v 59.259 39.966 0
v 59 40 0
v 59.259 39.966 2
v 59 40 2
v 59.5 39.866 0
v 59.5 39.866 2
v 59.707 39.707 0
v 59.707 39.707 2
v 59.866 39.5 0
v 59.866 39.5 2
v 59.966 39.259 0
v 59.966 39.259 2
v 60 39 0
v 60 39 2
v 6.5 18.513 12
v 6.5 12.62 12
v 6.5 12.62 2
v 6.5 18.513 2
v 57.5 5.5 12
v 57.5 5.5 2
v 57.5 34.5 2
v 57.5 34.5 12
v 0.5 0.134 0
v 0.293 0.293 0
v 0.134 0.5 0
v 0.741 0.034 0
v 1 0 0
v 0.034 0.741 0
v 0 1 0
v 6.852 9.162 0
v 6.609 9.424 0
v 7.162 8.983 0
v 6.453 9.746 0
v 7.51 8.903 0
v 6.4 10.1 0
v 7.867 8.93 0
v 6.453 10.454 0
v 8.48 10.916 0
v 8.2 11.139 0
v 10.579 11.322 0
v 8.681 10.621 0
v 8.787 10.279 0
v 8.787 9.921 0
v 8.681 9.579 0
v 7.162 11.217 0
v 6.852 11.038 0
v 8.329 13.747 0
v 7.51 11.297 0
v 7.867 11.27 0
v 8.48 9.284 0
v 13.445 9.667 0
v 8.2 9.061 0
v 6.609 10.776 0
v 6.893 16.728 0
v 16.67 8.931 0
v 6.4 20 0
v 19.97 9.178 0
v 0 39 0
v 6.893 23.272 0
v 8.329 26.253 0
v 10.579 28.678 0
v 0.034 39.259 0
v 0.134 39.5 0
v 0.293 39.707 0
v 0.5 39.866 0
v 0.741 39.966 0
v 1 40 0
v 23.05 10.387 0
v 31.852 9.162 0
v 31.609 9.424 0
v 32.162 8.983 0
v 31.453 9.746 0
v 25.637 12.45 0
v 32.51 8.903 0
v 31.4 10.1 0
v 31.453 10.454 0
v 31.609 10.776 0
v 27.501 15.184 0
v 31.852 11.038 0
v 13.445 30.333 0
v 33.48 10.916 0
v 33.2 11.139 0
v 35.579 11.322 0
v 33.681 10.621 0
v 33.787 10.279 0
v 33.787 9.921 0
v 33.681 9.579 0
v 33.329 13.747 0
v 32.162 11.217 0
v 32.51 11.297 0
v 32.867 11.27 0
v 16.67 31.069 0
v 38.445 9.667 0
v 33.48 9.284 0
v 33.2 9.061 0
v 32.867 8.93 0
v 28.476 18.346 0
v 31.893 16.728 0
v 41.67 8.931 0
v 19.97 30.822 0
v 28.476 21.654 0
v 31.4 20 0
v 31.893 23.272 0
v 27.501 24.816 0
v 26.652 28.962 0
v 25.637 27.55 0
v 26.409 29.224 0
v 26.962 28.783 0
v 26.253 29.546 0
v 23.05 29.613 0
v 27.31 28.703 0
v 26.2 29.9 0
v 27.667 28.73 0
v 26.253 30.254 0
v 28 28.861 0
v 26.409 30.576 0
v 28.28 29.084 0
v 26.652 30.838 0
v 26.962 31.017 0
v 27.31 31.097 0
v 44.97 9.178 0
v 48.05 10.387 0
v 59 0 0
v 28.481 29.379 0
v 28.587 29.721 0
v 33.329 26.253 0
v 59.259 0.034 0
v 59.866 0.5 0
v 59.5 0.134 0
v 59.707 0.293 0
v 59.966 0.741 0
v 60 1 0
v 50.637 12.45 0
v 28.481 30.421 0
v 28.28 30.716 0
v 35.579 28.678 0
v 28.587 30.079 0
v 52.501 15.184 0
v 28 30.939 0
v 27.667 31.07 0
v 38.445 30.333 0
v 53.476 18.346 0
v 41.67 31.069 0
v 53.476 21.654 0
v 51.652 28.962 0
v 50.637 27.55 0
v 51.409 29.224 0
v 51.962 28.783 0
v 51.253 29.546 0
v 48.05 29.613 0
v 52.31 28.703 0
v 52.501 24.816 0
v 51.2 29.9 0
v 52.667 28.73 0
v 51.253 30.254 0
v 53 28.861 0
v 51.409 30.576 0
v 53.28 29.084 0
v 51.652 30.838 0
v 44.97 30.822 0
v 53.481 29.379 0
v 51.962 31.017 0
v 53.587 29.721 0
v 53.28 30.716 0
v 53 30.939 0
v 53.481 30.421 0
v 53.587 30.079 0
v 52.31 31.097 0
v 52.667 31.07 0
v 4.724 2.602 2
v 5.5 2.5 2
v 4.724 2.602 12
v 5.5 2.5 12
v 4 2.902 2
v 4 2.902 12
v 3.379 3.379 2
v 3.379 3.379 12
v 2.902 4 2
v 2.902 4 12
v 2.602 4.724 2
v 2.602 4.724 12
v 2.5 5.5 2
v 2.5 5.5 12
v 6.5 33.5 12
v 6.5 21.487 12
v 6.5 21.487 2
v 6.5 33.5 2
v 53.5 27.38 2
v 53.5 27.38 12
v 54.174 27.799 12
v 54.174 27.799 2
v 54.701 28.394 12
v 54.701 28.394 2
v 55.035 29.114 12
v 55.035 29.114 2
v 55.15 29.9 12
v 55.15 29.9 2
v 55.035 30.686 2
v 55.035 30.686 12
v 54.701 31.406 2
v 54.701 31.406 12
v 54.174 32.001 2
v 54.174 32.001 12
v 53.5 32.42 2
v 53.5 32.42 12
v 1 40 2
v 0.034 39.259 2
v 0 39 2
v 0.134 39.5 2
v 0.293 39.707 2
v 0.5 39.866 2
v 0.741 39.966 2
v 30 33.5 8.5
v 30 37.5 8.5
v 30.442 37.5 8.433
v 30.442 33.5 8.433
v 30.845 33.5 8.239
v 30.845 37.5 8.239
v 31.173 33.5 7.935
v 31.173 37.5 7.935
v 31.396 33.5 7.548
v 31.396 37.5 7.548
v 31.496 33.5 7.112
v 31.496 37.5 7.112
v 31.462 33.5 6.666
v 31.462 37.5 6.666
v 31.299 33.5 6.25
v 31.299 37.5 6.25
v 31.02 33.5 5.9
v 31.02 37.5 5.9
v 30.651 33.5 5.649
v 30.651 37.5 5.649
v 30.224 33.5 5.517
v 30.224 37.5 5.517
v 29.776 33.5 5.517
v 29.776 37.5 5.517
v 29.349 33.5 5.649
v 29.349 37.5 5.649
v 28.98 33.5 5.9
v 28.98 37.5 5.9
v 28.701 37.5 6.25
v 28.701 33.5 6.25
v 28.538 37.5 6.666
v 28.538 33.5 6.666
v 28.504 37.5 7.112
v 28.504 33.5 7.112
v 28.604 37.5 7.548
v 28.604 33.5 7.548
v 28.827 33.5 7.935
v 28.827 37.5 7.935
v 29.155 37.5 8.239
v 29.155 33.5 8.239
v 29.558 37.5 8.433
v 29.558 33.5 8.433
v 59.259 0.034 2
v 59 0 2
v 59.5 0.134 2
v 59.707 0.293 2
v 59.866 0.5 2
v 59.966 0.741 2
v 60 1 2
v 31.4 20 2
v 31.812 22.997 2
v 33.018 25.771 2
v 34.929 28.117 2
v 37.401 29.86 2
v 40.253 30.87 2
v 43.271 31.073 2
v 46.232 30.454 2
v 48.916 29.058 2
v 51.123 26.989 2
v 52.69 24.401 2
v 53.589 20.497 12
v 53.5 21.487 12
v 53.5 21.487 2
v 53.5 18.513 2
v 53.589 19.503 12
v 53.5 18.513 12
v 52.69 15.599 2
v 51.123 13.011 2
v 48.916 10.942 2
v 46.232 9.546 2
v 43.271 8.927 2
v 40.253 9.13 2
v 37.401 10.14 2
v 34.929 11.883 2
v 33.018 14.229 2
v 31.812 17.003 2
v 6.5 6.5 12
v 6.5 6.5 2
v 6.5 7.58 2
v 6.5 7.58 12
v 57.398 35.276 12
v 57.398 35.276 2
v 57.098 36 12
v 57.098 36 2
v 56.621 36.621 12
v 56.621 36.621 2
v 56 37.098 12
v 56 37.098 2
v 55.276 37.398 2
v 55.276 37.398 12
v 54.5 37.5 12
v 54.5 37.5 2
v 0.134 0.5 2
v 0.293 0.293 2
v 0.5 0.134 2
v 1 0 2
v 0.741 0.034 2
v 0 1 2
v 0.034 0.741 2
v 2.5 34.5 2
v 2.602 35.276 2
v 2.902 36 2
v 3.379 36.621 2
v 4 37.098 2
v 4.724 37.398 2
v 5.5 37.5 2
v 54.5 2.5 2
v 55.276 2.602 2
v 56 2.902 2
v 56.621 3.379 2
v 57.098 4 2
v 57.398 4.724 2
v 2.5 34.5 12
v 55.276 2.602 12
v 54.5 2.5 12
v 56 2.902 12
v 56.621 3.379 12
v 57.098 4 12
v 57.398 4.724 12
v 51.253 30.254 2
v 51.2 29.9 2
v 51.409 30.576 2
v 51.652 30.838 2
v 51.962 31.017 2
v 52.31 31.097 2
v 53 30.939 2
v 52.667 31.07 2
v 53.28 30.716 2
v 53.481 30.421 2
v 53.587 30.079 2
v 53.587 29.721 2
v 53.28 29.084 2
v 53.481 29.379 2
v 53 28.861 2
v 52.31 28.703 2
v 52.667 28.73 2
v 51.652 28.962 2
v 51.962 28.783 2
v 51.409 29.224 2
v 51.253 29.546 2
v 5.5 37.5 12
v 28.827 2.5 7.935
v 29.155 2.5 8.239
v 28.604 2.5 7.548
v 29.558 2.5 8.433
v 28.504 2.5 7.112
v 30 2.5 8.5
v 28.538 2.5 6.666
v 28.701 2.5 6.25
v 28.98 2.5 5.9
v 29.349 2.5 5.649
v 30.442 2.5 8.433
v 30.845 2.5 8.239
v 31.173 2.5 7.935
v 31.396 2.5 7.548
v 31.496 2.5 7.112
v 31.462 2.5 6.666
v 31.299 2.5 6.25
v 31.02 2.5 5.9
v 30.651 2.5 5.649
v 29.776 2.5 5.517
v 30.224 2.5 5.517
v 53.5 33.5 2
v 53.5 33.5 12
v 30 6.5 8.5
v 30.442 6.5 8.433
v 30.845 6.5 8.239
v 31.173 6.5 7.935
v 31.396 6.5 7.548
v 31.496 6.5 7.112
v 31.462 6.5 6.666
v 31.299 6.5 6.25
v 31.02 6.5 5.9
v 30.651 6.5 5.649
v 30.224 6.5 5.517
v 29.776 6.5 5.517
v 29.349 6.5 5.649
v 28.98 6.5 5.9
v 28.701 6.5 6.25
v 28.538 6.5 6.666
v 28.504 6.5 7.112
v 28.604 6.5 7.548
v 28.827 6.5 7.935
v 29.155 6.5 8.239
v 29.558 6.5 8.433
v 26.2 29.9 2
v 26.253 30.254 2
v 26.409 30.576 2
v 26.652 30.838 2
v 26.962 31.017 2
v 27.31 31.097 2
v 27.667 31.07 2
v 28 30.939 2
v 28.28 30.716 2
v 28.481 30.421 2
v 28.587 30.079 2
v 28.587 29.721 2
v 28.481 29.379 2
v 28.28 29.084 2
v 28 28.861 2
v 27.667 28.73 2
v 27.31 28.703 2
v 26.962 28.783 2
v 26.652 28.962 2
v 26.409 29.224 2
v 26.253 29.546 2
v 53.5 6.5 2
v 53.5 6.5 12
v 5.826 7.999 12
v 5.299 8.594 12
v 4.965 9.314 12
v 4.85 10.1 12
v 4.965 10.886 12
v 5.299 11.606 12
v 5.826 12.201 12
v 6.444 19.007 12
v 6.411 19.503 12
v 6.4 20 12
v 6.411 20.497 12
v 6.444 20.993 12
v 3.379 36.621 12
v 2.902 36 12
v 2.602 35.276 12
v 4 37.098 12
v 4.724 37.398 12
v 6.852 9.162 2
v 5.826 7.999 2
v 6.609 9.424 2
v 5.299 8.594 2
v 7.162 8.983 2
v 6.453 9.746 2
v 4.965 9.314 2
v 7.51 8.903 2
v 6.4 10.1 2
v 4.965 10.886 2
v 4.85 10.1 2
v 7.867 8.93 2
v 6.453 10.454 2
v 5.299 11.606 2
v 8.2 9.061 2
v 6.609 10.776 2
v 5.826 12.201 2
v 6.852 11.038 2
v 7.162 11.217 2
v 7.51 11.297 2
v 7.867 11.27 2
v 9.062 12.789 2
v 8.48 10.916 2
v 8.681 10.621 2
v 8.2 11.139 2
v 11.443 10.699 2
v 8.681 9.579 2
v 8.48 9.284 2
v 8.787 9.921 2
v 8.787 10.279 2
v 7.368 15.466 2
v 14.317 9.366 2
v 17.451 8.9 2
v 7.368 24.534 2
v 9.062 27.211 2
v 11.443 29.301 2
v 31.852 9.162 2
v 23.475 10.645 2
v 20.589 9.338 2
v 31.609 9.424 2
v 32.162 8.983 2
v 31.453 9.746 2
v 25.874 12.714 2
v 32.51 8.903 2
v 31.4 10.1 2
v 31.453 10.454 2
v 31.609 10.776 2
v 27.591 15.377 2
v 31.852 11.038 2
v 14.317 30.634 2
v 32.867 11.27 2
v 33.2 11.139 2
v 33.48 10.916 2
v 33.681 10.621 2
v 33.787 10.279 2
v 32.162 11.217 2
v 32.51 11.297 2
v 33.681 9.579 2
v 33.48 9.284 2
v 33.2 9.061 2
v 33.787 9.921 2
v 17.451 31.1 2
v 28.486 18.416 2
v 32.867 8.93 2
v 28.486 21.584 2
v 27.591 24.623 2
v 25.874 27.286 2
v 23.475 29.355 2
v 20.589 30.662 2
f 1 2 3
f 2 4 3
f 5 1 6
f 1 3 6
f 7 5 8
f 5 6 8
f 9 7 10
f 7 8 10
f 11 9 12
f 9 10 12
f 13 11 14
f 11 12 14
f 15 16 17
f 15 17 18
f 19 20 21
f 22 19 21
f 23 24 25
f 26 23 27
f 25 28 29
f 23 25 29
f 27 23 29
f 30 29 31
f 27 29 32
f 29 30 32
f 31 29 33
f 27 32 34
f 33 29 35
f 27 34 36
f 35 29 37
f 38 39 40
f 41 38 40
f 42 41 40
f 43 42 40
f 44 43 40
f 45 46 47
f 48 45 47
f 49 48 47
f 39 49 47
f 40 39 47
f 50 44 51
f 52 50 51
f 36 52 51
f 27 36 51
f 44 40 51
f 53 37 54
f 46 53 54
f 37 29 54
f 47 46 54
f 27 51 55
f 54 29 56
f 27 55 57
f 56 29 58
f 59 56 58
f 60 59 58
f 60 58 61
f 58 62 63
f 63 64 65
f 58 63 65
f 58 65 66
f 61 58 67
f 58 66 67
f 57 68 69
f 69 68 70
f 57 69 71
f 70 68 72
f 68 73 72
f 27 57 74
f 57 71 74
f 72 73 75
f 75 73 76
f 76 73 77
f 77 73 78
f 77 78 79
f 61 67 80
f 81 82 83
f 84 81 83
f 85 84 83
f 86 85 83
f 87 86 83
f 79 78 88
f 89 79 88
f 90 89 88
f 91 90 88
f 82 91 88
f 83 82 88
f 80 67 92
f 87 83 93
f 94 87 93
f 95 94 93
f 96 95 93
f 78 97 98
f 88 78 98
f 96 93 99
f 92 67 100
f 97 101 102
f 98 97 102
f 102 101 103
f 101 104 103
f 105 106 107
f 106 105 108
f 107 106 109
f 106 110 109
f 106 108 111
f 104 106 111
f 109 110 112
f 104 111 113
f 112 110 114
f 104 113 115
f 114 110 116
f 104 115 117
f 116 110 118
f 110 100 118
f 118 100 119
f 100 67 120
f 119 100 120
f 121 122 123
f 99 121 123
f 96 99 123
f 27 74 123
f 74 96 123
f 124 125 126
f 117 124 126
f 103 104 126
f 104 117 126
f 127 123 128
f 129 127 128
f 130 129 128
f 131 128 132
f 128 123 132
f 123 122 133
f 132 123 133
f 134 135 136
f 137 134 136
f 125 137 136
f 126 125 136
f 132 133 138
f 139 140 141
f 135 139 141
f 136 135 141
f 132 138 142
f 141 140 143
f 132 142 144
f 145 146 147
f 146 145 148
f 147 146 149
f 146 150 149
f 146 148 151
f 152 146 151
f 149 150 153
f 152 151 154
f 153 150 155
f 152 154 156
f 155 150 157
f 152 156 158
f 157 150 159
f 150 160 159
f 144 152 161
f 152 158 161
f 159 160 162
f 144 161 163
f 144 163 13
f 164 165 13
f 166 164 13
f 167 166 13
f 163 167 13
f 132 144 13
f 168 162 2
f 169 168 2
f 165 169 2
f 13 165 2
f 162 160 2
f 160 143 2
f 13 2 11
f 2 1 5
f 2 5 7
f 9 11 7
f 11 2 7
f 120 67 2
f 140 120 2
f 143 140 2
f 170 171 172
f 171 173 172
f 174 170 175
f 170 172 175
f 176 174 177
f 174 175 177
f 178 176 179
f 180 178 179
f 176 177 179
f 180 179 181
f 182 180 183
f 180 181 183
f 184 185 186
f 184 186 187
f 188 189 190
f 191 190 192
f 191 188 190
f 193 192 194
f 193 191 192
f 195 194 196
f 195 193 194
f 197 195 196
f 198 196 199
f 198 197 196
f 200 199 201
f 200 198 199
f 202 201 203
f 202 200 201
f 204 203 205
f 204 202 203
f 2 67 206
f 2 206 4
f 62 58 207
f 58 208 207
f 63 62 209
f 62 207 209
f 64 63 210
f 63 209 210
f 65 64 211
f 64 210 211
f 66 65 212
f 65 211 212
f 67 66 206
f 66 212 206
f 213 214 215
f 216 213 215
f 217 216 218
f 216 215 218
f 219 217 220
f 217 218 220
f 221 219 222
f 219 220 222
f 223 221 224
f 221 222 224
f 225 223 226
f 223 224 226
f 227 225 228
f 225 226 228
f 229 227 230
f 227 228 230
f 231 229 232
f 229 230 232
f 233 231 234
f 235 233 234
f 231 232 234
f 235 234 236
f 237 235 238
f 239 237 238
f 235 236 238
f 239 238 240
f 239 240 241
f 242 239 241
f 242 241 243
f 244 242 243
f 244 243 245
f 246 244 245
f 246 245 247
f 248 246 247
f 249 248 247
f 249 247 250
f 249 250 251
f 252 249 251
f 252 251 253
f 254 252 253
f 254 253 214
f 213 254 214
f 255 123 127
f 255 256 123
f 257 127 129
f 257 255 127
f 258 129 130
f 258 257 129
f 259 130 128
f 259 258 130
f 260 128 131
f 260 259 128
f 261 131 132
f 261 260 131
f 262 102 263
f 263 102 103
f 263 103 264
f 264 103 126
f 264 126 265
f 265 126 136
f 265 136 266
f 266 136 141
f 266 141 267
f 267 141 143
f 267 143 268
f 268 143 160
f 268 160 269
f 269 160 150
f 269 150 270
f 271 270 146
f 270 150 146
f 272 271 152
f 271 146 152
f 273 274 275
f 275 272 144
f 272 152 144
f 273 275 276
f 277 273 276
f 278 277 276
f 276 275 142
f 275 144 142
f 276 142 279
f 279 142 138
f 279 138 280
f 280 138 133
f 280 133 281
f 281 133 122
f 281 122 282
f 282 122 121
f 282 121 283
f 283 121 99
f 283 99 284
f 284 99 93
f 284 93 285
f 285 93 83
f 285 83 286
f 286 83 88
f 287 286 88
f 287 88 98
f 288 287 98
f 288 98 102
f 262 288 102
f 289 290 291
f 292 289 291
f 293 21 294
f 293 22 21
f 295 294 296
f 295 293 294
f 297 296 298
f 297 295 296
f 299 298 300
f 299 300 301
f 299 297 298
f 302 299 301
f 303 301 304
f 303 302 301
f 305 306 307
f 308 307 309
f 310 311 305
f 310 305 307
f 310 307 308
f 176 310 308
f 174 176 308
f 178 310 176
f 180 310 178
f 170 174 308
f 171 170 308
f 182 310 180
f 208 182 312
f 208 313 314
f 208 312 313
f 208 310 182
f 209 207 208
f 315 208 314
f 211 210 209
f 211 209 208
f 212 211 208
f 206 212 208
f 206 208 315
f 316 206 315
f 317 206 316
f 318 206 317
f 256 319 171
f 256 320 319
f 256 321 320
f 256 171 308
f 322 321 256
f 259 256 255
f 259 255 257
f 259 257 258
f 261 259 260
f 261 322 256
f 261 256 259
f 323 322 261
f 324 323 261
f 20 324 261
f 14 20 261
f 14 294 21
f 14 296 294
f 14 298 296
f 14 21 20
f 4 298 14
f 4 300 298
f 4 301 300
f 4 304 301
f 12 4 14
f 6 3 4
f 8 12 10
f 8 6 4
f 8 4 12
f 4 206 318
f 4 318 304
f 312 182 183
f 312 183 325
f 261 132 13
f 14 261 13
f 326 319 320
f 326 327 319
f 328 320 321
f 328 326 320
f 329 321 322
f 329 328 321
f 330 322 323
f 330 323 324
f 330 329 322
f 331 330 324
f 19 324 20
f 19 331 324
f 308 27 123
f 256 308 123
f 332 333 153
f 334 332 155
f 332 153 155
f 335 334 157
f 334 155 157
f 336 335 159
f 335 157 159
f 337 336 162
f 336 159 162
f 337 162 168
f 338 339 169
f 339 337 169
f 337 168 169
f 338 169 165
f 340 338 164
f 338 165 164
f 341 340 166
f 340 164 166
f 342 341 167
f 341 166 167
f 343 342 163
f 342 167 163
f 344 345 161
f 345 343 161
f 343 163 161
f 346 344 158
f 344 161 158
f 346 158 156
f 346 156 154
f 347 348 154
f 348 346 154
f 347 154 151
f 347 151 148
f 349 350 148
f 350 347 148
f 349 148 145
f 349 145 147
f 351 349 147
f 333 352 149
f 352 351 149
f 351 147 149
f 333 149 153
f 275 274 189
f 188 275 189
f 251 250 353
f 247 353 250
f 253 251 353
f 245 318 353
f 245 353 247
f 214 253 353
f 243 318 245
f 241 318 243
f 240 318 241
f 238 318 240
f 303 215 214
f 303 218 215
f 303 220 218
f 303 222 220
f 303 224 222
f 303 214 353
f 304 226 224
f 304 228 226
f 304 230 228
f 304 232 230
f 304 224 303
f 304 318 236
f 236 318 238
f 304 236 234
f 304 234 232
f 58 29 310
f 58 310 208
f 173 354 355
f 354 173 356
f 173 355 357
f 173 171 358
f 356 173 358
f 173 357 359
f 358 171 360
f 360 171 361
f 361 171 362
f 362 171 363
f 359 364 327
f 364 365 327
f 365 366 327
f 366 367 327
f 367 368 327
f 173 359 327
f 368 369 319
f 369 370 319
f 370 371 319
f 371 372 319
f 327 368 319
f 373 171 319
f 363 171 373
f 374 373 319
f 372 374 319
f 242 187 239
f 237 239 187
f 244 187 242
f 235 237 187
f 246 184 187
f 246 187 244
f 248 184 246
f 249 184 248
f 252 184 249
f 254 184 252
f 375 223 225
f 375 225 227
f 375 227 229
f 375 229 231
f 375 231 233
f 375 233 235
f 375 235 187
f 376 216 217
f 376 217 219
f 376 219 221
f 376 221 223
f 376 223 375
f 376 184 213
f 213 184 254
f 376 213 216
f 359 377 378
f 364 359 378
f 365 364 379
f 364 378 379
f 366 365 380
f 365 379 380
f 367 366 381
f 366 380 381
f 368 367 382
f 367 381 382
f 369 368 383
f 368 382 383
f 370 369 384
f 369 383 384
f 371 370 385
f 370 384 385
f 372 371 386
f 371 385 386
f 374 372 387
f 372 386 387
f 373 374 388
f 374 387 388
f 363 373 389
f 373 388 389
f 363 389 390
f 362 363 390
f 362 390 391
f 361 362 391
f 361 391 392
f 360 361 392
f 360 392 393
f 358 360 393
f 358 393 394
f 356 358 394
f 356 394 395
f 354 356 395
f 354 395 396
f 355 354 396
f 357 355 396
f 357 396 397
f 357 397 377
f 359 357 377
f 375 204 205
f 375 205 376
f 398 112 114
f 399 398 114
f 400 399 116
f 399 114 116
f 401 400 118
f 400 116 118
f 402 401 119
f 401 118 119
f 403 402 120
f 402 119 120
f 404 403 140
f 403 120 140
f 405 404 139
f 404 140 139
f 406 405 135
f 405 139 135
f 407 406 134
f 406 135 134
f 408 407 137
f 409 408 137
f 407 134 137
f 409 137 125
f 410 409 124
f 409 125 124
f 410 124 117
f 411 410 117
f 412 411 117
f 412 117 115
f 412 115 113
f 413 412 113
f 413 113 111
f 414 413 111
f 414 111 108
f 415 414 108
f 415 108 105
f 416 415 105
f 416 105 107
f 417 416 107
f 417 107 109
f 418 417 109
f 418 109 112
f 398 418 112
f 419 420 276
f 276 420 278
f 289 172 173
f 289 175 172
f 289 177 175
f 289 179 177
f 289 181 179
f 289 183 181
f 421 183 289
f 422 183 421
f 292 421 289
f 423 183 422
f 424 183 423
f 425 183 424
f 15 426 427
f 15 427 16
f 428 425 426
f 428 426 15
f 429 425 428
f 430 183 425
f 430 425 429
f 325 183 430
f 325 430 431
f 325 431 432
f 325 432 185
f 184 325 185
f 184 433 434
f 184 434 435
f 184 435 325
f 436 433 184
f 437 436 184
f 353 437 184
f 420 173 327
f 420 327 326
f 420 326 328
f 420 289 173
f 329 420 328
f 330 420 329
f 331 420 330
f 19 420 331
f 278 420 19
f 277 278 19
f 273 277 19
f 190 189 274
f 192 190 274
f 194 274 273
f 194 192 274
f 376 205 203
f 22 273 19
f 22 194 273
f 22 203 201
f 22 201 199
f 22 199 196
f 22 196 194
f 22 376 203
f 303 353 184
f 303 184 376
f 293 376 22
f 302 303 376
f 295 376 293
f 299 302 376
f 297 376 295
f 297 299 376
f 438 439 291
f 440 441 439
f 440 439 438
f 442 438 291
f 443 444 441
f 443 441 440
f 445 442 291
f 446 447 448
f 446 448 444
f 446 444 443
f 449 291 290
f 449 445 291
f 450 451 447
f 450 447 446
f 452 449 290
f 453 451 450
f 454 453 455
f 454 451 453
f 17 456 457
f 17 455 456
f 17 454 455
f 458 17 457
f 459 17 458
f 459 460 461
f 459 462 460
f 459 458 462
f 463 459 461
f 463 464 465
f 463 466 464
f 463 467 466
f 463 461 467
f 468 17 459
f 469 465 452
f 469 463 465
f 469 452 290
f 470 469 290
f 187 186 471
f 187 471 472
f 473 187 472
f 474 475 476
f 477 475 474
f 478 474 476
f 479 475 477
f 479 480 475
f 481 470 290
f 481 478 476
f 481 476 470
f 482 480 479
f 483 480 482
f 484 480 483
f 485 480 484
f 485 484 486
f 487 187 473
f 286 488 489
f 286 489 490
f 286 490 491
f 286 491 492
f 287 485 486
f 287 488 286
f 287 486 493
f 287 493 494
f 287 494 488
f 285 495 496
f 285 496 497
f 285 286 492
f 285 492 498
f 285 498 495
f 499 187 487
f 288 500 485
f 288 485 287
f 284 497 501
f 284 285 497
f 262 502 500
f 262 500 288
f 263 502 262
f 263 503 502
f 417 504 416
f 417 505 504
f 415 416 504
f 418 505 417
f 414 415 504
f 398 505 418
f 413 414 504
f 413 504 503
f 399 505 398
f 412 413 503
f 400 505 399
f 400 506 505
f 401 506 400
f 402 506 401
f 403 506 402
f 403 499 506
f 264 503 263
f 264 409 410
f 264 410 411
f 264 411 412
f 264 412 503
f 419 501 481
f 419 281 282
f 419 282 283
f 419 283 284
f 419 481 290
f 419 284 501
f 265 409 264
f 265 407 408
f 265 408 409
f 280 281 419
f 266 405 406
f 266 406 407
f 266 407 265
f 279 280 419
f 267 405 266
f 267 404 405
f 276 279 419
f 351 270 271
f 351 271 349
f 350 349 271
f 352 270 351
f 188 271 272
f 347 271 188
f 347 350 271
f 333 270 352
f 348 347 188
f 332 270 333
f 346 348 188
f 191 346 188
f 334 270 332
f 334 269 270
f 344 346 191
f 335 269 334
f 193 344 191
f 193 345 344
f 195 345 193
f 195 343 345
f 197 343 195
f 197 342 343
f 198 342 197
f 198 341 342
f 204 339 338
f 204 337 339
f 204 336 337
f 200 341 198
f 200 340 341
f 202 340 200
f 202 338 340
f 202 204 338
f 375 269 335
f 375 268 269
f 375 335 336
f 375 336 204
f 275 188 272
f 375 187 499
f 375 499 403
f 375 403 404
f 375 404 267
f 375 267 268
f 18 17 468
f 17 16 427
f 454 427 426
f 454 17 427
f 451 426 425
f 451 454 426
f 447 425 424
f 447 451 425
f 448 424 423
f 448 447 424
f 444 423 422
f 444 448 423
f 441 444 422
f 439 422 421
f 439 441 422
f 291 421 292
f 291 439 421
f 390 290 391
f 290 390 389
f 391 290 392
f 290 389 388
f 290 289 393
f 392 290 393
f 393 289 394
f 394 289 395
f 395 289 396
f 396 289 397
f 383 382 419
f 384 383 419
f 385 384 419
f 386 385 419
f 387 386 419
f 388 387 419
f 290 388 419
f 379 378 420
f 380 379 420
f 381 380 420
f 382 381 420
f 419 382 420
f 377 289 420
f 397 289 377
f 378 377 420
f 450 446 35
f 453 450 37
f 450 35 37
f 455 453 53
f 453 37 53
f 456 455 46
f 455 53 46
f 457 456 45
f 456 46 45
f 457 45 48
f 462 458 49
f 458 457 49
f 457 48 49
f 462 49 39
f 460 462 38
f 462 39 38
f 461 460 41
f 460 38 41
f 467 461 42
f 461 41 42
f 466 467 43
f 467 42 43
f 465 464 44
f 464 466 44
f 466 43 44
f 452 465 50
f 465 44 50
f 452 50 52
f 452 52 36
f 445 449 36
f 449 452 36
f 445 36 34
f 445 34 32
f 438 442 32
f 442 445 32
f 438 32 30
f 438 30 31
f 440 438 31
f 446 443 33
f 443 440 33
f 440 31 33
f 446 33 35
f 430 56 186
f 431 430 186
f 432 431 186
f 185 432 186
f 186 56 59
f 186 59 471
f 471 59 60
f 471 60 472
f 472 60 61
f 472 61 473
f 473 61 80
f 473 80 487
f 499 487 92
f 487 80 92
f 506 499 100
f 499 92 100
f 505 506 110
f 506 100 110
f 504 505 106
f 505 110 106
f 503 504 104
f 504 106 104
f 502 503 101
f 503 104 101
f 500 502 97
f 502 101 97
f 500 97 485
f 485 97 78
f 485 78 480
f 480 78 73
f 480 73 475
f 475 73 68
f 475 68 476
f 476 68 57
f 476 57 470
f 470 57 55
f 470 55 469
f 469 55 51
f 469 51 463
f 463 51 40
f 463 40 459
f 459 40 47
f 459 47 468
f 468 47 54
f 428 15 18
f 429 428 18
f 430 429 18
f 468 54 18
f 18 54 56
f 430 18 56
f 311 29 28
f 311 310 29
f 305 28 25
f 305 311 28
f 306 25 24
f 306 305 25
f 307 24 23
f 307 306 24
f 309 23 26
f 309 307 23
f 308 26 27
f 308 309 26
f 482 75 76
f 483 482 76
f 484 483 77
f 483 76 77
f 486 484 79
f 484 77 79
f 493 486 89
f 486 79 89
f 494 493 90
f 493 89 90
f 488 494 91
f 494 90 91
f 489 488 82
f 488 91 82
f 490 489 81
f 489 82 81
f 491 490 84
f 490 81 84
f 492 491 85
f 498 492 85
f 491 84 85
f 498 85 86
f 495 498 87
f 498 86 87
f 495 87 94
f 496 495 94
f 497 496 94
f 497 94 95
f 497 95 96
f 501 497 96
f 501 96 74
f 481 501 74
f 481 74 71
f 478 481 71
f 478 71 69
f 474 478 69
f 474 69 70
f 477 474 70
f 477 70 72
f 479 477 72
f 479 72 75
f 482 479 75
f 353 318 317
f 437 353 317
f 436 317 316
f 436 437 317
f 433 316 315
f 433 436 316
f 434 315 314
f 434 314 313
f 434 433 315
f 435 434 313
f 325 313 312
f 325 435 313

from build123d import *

# Parameters (mm, degrees)
ESQUISSE1_W             = 60
ESQUISSE1_H             = 40
BOSS_EXTRU_1_DEPTH      = 2
ESQUISSE2_W             = 55
ESQUISSE2_H             = 35
BOSS_EXTRU_2_DEPTH      = 10
CONG_1_R                = 3
CONG_2_R                = 1
ESQUISSE3_W             = 47
ESQUISSE3_H             = 27
ENL_V_MAT_EXTRU_1_DEPTH = 10
ESQUISSE4_R             = 1.5
ENL_V_MAT_EXTRU_2_DEPTH = 72.765242283
ESQUISSE5_R             = 11.1
ESQUISSE5_R_2           = 1.2
ENL_V_MAT_EXTRU_3_DEPTH = 74.10266753
ESQUISSE6_R             = 2.75
ENL_V_MAT_EXTRU_4_DEPTH = 73.801098893


with BuildPart() as part:
    # Esquisse1 → Boss.-Extru.1 (new body)
    with BuildSketch(Plane.XY):
        with Locations((30, 20)):
            Rectangle(ESQUISSE1_W, ESQUISSE1_H)
    extrude(amount=BOSS_EXTRU_1_DEPTH)

    # Esquisse2 → Boss.-Extru.2 (add)
    with BuildSketch(Plane.XY.offset(2)):
        with Locations((30, 20)):
            Rectangle(ESQUISSE2_W, ESQUISSE2_H)
    extrude(amount=BOSS_EXTRU_2_DEPTH)

    # Congé1
    cong_1_edges = [part.edges().sort_by_distance(p)[0] for p in [
        (57.5, 37.5, 7),
        (2.5, 37.5, 7),
        (2.5, 2.5, 7),
        (57.5, 2.5, 7),
    ]]
    fillet(cong_1_edges, radius=CONG_1_R)

    # Congé2
    cong_2_edges = [part.edges().sort_by_distance(p)[0] for p in [
        (0, 40, 1),
        (60, 40, 1),
        (60, 0, 1),
        (0, 0, 1),
    ]]
    fillet(cong_2_edges, radius=CONG_2_R)

    # Esquisse3 → Enlèv. mat.-Extru.1 (cut)
    with BuildSketch(Plane.XY.offset(12)):
        with Locations((30, 20)):
            Rectangle(ESQUISSE3_W, ESQUISSE3_H)
    extrude(amount=-ENL_V_MAT_EXTRU_1_DEPTH, mode=Mode.SUBTRACT)

    # Esquisse4 → Enlèv. mat.-Extru.2 (cut, through all)
    with BuildSketch(Plane(origin=(0, 37.5, 0), x_dir=(1, 0, 0), z_dir=(0, 1, 0))):
        with Locations(Location((30, -7, 0), (0, 0, 270))):
            Circle(ESQUISSE4_R)
    extrude(amount=-ENL_V_MAT_EXTRU_2_DEPTH, mode=Mode.SUBTRACT)

    # Esquisse5 → Enlèv. mat.-Extru.3 (cut, through all)
    with BuildSketch(Plane(origin=(0, 0, 0), x_dir=(-1, 0, 0), z_dir=(0, 0, -1))):
        with Locations((-42.5, 20)):
            Circle(ESQUISSE5_R)
        with Locations((-17.5, 20)):
            Circle(ESQUISSE5_R)
        with Locations((-52.4, 29.9)):
            Circle(ESQUISSE5_R_2)
        with Locations((-32.6, 10.1)):
            Circle(ESQUISSE5_R_2)
        with Locations((-27.4, 29.9)):
            Circle(ESQUISSE5_R_2)
        with Locations((-7.6, 10.1)):
            Circle(ESQUISSE5_R_2)
    extrude(amount=-ENL_V_MAT_EXTRU_3_DEPTH, mode=Mode.SUBTRACT)

    # Esquisse6 → Enlèv. mat.-Extru.4 (cut, through all)
    with BuildSketch(Plane.XY.offset(2)):
        with Locations((7.6, 10.1)):
            Circle(ESQUISSE6_R)
        with Locations((52.4, 29.9)):
            Circle(ESQUISSE6_R)
    extrude(amount=ENL_V_MAT_EXTRU_4_DEPTH, mode=Mode.SUBTRACT)


solid = part.part
